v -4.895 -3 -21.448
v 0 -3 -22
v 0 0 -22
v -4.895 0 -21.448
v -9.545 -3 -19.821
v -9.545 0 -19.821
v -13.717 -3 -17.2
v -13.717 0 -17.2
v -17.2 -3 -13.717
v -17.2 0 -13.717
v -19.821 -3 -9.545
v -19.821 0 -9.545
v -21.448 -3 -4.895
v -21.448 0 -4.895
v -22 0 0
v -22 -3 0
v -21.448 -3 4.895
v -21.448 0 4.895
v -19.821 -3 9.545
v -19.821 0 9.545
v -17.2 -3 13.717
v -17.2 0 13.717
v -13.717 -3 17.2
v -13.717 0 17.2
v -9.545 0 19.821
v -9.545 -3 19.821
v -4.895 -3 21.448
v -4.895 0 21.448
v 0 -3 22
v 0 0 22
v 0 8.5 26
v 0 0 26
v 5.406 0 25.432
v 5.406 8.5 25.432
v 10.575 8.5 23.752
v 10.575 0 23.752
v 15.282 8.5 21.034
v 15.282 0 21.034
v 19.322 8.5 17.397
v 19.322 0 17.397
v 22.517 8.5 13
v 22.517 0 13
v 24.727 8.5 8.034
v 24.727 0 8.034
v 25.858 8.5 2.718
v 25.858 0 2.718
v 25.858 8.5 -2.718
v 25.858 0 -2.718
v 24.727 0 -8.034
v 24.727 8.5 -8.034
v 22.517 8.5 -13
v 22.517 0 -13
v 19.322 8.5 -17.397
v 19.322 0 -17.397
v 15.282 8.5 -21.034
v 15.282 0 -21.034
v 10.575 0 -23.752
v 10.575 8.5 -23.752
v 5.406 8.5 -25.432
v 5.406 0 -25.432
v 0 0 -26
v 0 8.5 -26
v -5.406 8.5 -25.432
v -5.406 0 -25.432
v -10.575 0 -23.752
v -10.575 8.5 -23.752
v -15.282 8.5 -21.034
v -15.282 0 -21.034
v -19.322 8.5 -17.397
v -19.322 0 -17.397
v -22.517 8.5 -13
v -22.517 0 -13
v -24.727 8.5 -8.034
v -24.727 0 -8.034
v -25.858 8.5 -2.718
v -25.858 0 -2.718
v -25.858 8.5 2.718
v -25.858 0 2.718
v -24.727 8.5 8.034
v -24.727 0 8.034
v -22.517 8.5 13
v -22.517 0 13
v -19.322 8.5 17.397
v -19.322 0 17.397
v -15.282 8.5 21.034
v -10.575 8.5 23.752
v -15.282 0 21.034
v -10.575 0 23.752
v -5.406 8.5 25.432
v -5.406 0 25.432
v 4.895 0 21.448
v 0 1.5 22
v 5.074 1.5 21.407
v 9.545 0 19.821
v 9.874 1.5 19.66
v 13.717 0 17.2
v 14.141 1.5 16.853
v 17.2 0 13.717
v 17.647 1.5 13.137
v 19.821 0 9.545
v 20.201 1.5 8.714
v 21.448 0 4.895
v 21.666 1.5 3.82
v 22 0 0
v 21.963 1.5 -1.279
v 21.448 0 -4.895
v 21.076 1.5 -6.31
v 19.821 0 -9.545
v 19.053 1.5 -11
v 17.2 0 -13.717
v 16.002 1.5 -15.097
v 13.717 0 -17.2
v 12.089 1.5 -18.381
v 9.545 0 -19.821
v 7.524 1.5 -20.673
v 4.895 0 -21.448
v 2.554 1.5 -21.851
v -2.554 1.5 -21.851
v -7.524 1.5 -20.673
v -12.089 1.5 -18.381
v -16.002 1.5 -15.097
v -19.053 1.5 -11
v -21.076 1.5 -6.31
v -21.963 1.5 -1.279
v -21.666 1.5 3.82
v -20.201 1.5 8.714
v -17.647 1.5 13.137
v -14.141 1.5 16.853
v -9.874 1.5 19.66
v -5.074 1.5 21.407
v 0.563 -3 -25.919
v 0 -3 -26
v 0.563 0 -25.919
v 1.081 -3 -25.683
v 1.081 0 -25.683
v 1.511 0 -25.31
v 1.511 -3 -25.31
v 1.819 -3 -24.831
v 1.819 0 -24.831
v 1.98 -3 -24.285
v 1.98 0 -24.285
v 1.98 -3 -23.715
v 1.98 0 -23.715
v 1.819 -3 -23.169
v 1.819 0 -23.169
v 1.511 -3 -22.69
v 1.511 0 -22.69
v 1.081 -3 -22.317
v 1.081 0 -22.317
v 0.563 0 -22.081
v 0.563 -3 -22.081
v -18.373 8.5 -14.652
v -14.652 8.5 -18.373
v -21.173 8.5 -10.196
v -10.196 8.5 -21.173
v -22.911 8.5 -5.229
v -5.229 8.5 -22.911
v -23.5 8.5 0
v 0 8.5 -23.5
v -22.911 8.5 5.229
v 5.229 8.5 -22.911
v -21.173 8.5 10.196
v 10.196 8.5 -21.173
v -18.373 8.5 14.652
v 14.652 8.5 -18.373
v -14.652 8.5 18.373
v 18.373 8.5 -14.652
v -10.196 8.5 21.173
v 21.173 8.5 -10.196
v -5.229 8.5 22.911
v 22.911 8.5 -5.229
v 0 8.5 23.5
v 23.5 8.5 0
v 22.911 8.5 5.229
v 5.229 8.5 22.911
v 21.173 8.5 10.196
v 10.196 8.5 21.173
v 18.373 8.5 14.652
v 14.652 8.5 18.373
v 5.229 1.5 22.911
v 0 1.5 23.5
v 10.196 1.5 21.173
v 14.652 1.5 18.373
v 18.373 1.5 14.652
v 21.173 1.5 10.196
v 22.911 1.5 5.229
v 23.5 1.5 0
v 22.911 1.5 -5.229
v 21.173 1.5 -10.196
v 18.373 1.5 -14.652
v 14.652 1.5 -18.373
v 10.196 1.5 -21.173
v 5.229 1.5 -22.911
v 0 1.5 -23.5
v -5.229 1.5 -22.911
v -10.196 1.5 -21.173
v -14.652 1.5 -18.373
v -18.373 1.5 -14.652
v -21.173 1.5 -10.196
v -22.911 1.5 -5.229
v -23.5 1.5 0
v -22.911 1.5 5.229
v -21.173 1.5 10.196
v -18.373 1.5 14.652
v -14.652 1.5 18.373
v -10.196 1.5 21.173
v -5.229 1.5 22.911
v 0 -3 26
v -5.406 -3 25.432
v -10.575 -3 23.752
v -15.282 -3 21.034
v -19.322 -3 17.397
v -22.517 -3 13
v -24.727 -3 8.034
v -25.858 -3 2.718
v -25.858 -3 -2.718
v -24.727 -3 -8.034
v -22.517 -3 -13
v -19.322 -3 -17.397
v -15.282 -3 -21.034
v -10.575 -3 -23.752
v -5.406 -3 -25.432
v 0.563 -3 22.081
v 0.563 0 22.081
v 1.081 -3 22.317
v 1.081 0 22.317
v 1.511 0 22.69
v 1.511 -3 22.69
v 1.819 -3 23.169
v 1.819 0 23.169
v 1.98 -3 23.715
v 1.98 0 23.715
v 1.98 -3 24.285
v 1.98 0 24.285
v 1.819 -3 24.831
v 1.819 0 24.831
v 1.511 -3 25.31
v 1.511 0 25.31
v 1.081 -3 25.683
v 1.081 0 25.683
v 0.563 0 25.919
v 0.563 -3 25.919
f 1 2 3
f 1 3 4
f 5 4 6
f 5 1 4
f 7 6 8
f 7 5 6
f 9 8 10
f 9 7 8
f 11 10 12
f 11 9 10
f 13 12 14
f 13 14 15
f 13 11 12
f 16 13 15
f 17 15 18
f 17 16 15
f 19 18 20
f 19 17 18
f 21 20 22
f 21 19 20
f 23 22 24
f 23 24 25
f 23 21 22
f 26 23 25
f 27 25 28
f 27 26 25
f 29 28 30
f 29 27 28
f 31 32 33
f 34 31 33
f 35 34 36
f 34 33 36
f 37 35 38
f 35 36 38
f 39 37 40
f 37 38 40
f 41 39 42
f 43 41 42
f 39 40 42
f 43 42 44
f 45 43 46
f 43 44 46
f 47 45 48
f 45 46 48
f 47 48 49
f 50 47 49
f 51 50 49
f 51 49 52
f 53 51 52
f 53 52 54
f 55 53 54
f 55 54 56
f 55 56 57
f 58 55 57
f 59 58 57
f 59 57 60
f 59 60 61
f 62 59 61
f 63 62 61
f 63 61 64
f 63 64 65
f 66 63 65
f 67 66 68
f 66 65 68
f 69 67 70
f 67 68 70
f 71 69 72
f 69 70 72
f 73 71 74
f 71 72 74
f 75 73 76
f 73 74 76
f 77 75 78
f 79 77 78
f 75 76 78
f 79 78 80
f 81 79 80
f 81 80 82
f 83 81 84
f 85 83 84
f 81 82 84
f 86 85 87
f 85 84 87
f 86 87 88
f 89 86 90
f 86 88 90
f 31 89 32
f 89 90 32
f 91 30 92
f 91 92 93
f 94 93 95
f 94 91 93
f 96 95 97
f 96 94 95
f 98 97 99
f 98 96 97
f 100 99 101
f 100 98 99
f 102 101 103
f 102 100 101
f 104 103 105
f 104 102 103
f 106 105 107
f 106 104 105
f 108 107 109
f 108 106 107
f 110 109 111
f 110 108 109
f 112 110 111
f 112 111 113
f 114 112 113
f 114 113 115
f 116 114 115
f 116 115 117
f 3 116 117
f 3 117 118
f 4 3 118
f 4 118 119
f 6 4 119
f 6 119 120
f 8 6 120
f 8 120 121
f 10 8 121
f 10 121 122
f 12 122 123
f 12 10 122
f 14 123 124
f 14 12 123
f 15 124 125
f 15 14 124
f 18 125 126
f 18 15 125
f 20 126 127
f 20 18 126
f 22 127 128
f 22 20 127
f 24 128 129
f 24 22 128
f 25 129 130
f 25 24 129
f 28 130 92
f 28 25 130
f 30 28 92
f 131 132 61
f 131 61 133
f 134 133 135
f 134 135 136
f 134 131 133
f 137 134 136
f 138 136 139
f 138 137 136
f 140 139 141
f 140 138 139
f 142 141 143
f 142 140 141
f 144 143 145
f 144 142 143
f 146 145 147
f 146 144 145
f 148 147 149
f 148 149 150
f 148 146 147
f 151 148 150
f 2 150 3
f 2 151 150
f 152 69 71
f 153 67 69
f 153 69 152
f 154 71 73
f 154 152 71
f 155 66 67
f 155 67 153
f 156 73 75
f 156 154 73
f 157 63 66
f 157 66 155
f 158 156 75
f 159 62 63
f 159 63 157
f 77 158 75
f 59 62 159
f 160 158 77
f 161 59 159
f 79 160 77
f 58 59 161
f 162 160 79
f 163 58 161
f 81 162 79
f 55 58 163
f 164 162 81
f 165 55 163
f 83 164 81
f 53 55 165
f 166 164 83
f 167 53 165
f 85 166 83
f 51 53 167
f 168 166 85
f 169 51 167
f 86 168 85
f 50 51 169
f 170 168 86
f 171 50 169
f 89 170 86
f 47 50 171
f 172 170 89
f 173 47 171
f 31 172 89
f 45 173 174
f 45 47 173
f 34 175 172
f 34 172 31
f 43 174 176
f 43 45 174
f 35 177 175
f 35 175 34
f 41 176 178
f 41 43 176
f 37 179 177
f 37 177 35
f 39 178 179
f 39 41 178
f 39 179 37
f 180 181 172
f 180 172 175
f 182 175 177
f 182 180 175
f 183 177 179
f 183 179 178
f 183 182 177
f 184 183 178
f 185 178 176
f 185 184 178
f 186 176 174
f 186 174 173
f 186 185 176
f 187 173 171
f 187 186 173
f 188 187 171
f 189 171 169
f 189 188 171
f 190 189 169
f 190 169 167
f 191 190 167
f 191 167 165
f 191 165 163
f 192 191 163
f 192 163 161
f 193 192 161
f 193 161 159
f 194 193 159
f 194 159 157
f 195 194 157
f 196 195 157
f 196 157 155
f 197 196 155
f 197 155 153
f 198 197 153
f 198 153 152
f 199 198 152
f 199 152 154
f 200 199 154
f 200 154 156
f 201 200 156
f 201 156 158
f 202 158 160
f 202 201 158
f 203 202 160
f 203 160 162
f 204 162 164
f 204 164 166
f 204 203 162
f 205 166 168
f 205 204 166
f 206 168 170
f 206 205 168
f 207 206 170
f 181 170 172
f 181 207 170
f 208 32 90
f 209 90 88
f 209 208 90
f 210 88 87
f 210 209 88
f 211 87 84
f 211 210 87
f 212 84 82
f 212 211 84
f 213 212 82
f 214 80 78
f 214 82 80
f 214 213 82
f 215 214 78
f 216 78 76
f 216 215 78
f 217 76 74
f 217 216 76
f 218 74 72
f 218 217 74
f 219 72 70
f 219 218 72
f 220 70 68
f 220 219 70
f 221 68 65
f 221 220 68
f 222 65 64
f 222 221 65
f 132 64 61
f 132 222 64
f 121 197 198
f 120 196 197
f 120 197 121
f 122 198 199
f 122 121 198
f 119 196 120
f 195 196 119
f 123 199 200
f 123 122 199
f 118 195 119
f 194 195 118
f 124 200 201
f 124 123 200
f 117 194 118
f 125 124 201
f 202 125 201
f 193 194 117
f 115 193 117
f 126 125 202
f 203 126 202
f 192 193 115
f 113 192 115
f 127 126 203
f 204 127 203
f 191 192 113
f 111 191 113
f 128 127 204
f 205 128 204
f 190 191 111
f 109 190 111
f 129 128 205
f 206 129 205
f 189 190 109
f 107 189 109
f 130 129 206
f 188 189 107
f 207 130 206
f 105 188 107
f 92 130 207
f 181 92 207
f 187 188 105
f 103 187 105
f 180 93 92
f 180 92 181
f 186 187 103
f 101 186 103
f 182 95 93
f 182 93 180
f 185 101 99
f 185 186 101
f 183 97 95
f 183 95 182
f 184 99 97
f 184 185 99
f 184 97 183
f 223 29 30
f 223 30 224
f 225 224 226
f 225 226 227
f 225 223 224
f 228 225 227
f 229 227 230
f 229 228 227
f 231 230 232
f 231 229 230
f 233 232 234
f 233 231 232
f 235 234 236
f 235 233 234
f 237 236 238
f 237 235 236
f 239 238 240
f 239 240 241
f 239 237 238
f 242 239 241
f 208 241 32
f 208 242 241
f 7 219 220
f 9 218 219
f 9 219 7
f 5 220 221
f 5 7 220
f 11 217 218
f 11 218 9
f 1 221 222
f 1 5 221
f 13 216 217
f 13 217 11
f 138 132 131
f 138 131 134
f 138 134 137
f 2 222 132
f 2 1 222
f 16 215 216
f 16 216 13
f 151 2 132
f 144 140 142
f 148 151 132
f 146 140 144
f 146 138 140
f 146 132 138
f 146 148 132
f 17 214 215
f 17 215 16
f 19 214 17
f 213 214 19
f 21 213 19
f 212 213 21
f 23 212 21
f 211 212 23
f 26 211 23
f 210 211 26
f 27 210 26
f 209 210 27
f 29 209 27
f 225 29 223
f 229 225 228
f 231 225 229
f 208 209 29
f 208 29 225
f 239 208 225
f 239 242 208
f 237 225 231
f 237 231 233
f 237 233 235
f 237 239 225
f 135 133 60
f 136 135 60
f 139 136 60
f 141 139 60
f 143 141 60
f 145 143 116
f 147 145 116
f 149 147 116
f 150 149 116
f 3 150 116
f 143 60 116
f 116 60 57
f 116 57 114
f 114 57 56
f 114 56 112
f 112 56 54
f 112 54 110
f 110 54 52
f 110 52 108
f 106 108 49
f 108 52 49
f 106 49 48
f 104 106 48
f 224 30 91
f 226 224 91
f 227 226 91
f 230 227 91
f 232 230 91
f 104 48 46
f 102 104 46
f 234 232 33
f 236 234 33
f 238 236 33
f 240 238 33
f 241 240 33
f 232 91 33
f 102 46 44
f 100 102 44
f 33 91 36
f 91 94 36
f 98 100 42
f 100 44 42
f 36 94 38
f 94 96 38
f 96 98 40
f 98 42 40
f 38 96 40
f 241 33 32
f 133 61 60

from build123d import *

# Parameters (mm, degrees)
SKETCH1_R           = 23.5
SKETCH1_R_2         = 22
BOSS_EXTRUDE1_DEPTH = 1.5
SKETCH2_R           = 26
SKETCH2_R_2         = 23.5
BOSS_EXTRUDE2_DEPTH = 8.5
BOSS_EXTRUDE3_START = 3
BOSS_EXTRUDE3_DEPTH = 3


with BuildPart() as part:
    # Sketch1 → Boss-Extrude1 (new body)
    with BuildSketch(Plane(origin=(0, 0, 0), x_dir=(1, 0, 0), z_dir=(0, 1, 0))):
        with Locations(Location((0, 0, 0), (0, 0, 270))):
            Circle(SKETCH1_R)
        with Locations(Location((0, 0, 0), (0, 0, 270))):
            Circle(SKETCH1_R_2, mode=Mode.SUBTRACT)
    extrude(amount=BOSS_EXTRUDE1_DEPTH)

    # Sketch2 → Boss-Extrude2 (add)
    with BuildSketch(Plane(origin=(0, 0, 0), x_dir=(1, 0, 0), z_dir=(0, 1, 0))):
        with Locations(Location((0, 0, 0), (0, 0, 270))):
            Circle(SKETCH2_R)
        with Locations(Location((0, 0, 0), (0, 0, 270))):
            Circle(SKETCH2_R_2, mode=Mode.SUBTRACT)
    extrude(amount=BOSS_EXTRUDE2_DEPTH)

    # Sketch3 → Boss-Extrude3 (add)
    with BuildSketch(Plane.XZ.offset(BOSS_EXTRUDE3_START)):
        with BuildLine():
            ThreePointArc((0, 26), (-26, 0), (0, -26))
            ThreePointArc((0, -26), (2, -24), (0, -22))
            ThreePointArc((0, -22), (-22, 0), (0, 22))
            ThreePointArc((0, 22), (2, 24), (0, 26))
        make_face()
    extrude(amount=-BOSS_EXTRUDE3_DEPTH)


solid = part.part
